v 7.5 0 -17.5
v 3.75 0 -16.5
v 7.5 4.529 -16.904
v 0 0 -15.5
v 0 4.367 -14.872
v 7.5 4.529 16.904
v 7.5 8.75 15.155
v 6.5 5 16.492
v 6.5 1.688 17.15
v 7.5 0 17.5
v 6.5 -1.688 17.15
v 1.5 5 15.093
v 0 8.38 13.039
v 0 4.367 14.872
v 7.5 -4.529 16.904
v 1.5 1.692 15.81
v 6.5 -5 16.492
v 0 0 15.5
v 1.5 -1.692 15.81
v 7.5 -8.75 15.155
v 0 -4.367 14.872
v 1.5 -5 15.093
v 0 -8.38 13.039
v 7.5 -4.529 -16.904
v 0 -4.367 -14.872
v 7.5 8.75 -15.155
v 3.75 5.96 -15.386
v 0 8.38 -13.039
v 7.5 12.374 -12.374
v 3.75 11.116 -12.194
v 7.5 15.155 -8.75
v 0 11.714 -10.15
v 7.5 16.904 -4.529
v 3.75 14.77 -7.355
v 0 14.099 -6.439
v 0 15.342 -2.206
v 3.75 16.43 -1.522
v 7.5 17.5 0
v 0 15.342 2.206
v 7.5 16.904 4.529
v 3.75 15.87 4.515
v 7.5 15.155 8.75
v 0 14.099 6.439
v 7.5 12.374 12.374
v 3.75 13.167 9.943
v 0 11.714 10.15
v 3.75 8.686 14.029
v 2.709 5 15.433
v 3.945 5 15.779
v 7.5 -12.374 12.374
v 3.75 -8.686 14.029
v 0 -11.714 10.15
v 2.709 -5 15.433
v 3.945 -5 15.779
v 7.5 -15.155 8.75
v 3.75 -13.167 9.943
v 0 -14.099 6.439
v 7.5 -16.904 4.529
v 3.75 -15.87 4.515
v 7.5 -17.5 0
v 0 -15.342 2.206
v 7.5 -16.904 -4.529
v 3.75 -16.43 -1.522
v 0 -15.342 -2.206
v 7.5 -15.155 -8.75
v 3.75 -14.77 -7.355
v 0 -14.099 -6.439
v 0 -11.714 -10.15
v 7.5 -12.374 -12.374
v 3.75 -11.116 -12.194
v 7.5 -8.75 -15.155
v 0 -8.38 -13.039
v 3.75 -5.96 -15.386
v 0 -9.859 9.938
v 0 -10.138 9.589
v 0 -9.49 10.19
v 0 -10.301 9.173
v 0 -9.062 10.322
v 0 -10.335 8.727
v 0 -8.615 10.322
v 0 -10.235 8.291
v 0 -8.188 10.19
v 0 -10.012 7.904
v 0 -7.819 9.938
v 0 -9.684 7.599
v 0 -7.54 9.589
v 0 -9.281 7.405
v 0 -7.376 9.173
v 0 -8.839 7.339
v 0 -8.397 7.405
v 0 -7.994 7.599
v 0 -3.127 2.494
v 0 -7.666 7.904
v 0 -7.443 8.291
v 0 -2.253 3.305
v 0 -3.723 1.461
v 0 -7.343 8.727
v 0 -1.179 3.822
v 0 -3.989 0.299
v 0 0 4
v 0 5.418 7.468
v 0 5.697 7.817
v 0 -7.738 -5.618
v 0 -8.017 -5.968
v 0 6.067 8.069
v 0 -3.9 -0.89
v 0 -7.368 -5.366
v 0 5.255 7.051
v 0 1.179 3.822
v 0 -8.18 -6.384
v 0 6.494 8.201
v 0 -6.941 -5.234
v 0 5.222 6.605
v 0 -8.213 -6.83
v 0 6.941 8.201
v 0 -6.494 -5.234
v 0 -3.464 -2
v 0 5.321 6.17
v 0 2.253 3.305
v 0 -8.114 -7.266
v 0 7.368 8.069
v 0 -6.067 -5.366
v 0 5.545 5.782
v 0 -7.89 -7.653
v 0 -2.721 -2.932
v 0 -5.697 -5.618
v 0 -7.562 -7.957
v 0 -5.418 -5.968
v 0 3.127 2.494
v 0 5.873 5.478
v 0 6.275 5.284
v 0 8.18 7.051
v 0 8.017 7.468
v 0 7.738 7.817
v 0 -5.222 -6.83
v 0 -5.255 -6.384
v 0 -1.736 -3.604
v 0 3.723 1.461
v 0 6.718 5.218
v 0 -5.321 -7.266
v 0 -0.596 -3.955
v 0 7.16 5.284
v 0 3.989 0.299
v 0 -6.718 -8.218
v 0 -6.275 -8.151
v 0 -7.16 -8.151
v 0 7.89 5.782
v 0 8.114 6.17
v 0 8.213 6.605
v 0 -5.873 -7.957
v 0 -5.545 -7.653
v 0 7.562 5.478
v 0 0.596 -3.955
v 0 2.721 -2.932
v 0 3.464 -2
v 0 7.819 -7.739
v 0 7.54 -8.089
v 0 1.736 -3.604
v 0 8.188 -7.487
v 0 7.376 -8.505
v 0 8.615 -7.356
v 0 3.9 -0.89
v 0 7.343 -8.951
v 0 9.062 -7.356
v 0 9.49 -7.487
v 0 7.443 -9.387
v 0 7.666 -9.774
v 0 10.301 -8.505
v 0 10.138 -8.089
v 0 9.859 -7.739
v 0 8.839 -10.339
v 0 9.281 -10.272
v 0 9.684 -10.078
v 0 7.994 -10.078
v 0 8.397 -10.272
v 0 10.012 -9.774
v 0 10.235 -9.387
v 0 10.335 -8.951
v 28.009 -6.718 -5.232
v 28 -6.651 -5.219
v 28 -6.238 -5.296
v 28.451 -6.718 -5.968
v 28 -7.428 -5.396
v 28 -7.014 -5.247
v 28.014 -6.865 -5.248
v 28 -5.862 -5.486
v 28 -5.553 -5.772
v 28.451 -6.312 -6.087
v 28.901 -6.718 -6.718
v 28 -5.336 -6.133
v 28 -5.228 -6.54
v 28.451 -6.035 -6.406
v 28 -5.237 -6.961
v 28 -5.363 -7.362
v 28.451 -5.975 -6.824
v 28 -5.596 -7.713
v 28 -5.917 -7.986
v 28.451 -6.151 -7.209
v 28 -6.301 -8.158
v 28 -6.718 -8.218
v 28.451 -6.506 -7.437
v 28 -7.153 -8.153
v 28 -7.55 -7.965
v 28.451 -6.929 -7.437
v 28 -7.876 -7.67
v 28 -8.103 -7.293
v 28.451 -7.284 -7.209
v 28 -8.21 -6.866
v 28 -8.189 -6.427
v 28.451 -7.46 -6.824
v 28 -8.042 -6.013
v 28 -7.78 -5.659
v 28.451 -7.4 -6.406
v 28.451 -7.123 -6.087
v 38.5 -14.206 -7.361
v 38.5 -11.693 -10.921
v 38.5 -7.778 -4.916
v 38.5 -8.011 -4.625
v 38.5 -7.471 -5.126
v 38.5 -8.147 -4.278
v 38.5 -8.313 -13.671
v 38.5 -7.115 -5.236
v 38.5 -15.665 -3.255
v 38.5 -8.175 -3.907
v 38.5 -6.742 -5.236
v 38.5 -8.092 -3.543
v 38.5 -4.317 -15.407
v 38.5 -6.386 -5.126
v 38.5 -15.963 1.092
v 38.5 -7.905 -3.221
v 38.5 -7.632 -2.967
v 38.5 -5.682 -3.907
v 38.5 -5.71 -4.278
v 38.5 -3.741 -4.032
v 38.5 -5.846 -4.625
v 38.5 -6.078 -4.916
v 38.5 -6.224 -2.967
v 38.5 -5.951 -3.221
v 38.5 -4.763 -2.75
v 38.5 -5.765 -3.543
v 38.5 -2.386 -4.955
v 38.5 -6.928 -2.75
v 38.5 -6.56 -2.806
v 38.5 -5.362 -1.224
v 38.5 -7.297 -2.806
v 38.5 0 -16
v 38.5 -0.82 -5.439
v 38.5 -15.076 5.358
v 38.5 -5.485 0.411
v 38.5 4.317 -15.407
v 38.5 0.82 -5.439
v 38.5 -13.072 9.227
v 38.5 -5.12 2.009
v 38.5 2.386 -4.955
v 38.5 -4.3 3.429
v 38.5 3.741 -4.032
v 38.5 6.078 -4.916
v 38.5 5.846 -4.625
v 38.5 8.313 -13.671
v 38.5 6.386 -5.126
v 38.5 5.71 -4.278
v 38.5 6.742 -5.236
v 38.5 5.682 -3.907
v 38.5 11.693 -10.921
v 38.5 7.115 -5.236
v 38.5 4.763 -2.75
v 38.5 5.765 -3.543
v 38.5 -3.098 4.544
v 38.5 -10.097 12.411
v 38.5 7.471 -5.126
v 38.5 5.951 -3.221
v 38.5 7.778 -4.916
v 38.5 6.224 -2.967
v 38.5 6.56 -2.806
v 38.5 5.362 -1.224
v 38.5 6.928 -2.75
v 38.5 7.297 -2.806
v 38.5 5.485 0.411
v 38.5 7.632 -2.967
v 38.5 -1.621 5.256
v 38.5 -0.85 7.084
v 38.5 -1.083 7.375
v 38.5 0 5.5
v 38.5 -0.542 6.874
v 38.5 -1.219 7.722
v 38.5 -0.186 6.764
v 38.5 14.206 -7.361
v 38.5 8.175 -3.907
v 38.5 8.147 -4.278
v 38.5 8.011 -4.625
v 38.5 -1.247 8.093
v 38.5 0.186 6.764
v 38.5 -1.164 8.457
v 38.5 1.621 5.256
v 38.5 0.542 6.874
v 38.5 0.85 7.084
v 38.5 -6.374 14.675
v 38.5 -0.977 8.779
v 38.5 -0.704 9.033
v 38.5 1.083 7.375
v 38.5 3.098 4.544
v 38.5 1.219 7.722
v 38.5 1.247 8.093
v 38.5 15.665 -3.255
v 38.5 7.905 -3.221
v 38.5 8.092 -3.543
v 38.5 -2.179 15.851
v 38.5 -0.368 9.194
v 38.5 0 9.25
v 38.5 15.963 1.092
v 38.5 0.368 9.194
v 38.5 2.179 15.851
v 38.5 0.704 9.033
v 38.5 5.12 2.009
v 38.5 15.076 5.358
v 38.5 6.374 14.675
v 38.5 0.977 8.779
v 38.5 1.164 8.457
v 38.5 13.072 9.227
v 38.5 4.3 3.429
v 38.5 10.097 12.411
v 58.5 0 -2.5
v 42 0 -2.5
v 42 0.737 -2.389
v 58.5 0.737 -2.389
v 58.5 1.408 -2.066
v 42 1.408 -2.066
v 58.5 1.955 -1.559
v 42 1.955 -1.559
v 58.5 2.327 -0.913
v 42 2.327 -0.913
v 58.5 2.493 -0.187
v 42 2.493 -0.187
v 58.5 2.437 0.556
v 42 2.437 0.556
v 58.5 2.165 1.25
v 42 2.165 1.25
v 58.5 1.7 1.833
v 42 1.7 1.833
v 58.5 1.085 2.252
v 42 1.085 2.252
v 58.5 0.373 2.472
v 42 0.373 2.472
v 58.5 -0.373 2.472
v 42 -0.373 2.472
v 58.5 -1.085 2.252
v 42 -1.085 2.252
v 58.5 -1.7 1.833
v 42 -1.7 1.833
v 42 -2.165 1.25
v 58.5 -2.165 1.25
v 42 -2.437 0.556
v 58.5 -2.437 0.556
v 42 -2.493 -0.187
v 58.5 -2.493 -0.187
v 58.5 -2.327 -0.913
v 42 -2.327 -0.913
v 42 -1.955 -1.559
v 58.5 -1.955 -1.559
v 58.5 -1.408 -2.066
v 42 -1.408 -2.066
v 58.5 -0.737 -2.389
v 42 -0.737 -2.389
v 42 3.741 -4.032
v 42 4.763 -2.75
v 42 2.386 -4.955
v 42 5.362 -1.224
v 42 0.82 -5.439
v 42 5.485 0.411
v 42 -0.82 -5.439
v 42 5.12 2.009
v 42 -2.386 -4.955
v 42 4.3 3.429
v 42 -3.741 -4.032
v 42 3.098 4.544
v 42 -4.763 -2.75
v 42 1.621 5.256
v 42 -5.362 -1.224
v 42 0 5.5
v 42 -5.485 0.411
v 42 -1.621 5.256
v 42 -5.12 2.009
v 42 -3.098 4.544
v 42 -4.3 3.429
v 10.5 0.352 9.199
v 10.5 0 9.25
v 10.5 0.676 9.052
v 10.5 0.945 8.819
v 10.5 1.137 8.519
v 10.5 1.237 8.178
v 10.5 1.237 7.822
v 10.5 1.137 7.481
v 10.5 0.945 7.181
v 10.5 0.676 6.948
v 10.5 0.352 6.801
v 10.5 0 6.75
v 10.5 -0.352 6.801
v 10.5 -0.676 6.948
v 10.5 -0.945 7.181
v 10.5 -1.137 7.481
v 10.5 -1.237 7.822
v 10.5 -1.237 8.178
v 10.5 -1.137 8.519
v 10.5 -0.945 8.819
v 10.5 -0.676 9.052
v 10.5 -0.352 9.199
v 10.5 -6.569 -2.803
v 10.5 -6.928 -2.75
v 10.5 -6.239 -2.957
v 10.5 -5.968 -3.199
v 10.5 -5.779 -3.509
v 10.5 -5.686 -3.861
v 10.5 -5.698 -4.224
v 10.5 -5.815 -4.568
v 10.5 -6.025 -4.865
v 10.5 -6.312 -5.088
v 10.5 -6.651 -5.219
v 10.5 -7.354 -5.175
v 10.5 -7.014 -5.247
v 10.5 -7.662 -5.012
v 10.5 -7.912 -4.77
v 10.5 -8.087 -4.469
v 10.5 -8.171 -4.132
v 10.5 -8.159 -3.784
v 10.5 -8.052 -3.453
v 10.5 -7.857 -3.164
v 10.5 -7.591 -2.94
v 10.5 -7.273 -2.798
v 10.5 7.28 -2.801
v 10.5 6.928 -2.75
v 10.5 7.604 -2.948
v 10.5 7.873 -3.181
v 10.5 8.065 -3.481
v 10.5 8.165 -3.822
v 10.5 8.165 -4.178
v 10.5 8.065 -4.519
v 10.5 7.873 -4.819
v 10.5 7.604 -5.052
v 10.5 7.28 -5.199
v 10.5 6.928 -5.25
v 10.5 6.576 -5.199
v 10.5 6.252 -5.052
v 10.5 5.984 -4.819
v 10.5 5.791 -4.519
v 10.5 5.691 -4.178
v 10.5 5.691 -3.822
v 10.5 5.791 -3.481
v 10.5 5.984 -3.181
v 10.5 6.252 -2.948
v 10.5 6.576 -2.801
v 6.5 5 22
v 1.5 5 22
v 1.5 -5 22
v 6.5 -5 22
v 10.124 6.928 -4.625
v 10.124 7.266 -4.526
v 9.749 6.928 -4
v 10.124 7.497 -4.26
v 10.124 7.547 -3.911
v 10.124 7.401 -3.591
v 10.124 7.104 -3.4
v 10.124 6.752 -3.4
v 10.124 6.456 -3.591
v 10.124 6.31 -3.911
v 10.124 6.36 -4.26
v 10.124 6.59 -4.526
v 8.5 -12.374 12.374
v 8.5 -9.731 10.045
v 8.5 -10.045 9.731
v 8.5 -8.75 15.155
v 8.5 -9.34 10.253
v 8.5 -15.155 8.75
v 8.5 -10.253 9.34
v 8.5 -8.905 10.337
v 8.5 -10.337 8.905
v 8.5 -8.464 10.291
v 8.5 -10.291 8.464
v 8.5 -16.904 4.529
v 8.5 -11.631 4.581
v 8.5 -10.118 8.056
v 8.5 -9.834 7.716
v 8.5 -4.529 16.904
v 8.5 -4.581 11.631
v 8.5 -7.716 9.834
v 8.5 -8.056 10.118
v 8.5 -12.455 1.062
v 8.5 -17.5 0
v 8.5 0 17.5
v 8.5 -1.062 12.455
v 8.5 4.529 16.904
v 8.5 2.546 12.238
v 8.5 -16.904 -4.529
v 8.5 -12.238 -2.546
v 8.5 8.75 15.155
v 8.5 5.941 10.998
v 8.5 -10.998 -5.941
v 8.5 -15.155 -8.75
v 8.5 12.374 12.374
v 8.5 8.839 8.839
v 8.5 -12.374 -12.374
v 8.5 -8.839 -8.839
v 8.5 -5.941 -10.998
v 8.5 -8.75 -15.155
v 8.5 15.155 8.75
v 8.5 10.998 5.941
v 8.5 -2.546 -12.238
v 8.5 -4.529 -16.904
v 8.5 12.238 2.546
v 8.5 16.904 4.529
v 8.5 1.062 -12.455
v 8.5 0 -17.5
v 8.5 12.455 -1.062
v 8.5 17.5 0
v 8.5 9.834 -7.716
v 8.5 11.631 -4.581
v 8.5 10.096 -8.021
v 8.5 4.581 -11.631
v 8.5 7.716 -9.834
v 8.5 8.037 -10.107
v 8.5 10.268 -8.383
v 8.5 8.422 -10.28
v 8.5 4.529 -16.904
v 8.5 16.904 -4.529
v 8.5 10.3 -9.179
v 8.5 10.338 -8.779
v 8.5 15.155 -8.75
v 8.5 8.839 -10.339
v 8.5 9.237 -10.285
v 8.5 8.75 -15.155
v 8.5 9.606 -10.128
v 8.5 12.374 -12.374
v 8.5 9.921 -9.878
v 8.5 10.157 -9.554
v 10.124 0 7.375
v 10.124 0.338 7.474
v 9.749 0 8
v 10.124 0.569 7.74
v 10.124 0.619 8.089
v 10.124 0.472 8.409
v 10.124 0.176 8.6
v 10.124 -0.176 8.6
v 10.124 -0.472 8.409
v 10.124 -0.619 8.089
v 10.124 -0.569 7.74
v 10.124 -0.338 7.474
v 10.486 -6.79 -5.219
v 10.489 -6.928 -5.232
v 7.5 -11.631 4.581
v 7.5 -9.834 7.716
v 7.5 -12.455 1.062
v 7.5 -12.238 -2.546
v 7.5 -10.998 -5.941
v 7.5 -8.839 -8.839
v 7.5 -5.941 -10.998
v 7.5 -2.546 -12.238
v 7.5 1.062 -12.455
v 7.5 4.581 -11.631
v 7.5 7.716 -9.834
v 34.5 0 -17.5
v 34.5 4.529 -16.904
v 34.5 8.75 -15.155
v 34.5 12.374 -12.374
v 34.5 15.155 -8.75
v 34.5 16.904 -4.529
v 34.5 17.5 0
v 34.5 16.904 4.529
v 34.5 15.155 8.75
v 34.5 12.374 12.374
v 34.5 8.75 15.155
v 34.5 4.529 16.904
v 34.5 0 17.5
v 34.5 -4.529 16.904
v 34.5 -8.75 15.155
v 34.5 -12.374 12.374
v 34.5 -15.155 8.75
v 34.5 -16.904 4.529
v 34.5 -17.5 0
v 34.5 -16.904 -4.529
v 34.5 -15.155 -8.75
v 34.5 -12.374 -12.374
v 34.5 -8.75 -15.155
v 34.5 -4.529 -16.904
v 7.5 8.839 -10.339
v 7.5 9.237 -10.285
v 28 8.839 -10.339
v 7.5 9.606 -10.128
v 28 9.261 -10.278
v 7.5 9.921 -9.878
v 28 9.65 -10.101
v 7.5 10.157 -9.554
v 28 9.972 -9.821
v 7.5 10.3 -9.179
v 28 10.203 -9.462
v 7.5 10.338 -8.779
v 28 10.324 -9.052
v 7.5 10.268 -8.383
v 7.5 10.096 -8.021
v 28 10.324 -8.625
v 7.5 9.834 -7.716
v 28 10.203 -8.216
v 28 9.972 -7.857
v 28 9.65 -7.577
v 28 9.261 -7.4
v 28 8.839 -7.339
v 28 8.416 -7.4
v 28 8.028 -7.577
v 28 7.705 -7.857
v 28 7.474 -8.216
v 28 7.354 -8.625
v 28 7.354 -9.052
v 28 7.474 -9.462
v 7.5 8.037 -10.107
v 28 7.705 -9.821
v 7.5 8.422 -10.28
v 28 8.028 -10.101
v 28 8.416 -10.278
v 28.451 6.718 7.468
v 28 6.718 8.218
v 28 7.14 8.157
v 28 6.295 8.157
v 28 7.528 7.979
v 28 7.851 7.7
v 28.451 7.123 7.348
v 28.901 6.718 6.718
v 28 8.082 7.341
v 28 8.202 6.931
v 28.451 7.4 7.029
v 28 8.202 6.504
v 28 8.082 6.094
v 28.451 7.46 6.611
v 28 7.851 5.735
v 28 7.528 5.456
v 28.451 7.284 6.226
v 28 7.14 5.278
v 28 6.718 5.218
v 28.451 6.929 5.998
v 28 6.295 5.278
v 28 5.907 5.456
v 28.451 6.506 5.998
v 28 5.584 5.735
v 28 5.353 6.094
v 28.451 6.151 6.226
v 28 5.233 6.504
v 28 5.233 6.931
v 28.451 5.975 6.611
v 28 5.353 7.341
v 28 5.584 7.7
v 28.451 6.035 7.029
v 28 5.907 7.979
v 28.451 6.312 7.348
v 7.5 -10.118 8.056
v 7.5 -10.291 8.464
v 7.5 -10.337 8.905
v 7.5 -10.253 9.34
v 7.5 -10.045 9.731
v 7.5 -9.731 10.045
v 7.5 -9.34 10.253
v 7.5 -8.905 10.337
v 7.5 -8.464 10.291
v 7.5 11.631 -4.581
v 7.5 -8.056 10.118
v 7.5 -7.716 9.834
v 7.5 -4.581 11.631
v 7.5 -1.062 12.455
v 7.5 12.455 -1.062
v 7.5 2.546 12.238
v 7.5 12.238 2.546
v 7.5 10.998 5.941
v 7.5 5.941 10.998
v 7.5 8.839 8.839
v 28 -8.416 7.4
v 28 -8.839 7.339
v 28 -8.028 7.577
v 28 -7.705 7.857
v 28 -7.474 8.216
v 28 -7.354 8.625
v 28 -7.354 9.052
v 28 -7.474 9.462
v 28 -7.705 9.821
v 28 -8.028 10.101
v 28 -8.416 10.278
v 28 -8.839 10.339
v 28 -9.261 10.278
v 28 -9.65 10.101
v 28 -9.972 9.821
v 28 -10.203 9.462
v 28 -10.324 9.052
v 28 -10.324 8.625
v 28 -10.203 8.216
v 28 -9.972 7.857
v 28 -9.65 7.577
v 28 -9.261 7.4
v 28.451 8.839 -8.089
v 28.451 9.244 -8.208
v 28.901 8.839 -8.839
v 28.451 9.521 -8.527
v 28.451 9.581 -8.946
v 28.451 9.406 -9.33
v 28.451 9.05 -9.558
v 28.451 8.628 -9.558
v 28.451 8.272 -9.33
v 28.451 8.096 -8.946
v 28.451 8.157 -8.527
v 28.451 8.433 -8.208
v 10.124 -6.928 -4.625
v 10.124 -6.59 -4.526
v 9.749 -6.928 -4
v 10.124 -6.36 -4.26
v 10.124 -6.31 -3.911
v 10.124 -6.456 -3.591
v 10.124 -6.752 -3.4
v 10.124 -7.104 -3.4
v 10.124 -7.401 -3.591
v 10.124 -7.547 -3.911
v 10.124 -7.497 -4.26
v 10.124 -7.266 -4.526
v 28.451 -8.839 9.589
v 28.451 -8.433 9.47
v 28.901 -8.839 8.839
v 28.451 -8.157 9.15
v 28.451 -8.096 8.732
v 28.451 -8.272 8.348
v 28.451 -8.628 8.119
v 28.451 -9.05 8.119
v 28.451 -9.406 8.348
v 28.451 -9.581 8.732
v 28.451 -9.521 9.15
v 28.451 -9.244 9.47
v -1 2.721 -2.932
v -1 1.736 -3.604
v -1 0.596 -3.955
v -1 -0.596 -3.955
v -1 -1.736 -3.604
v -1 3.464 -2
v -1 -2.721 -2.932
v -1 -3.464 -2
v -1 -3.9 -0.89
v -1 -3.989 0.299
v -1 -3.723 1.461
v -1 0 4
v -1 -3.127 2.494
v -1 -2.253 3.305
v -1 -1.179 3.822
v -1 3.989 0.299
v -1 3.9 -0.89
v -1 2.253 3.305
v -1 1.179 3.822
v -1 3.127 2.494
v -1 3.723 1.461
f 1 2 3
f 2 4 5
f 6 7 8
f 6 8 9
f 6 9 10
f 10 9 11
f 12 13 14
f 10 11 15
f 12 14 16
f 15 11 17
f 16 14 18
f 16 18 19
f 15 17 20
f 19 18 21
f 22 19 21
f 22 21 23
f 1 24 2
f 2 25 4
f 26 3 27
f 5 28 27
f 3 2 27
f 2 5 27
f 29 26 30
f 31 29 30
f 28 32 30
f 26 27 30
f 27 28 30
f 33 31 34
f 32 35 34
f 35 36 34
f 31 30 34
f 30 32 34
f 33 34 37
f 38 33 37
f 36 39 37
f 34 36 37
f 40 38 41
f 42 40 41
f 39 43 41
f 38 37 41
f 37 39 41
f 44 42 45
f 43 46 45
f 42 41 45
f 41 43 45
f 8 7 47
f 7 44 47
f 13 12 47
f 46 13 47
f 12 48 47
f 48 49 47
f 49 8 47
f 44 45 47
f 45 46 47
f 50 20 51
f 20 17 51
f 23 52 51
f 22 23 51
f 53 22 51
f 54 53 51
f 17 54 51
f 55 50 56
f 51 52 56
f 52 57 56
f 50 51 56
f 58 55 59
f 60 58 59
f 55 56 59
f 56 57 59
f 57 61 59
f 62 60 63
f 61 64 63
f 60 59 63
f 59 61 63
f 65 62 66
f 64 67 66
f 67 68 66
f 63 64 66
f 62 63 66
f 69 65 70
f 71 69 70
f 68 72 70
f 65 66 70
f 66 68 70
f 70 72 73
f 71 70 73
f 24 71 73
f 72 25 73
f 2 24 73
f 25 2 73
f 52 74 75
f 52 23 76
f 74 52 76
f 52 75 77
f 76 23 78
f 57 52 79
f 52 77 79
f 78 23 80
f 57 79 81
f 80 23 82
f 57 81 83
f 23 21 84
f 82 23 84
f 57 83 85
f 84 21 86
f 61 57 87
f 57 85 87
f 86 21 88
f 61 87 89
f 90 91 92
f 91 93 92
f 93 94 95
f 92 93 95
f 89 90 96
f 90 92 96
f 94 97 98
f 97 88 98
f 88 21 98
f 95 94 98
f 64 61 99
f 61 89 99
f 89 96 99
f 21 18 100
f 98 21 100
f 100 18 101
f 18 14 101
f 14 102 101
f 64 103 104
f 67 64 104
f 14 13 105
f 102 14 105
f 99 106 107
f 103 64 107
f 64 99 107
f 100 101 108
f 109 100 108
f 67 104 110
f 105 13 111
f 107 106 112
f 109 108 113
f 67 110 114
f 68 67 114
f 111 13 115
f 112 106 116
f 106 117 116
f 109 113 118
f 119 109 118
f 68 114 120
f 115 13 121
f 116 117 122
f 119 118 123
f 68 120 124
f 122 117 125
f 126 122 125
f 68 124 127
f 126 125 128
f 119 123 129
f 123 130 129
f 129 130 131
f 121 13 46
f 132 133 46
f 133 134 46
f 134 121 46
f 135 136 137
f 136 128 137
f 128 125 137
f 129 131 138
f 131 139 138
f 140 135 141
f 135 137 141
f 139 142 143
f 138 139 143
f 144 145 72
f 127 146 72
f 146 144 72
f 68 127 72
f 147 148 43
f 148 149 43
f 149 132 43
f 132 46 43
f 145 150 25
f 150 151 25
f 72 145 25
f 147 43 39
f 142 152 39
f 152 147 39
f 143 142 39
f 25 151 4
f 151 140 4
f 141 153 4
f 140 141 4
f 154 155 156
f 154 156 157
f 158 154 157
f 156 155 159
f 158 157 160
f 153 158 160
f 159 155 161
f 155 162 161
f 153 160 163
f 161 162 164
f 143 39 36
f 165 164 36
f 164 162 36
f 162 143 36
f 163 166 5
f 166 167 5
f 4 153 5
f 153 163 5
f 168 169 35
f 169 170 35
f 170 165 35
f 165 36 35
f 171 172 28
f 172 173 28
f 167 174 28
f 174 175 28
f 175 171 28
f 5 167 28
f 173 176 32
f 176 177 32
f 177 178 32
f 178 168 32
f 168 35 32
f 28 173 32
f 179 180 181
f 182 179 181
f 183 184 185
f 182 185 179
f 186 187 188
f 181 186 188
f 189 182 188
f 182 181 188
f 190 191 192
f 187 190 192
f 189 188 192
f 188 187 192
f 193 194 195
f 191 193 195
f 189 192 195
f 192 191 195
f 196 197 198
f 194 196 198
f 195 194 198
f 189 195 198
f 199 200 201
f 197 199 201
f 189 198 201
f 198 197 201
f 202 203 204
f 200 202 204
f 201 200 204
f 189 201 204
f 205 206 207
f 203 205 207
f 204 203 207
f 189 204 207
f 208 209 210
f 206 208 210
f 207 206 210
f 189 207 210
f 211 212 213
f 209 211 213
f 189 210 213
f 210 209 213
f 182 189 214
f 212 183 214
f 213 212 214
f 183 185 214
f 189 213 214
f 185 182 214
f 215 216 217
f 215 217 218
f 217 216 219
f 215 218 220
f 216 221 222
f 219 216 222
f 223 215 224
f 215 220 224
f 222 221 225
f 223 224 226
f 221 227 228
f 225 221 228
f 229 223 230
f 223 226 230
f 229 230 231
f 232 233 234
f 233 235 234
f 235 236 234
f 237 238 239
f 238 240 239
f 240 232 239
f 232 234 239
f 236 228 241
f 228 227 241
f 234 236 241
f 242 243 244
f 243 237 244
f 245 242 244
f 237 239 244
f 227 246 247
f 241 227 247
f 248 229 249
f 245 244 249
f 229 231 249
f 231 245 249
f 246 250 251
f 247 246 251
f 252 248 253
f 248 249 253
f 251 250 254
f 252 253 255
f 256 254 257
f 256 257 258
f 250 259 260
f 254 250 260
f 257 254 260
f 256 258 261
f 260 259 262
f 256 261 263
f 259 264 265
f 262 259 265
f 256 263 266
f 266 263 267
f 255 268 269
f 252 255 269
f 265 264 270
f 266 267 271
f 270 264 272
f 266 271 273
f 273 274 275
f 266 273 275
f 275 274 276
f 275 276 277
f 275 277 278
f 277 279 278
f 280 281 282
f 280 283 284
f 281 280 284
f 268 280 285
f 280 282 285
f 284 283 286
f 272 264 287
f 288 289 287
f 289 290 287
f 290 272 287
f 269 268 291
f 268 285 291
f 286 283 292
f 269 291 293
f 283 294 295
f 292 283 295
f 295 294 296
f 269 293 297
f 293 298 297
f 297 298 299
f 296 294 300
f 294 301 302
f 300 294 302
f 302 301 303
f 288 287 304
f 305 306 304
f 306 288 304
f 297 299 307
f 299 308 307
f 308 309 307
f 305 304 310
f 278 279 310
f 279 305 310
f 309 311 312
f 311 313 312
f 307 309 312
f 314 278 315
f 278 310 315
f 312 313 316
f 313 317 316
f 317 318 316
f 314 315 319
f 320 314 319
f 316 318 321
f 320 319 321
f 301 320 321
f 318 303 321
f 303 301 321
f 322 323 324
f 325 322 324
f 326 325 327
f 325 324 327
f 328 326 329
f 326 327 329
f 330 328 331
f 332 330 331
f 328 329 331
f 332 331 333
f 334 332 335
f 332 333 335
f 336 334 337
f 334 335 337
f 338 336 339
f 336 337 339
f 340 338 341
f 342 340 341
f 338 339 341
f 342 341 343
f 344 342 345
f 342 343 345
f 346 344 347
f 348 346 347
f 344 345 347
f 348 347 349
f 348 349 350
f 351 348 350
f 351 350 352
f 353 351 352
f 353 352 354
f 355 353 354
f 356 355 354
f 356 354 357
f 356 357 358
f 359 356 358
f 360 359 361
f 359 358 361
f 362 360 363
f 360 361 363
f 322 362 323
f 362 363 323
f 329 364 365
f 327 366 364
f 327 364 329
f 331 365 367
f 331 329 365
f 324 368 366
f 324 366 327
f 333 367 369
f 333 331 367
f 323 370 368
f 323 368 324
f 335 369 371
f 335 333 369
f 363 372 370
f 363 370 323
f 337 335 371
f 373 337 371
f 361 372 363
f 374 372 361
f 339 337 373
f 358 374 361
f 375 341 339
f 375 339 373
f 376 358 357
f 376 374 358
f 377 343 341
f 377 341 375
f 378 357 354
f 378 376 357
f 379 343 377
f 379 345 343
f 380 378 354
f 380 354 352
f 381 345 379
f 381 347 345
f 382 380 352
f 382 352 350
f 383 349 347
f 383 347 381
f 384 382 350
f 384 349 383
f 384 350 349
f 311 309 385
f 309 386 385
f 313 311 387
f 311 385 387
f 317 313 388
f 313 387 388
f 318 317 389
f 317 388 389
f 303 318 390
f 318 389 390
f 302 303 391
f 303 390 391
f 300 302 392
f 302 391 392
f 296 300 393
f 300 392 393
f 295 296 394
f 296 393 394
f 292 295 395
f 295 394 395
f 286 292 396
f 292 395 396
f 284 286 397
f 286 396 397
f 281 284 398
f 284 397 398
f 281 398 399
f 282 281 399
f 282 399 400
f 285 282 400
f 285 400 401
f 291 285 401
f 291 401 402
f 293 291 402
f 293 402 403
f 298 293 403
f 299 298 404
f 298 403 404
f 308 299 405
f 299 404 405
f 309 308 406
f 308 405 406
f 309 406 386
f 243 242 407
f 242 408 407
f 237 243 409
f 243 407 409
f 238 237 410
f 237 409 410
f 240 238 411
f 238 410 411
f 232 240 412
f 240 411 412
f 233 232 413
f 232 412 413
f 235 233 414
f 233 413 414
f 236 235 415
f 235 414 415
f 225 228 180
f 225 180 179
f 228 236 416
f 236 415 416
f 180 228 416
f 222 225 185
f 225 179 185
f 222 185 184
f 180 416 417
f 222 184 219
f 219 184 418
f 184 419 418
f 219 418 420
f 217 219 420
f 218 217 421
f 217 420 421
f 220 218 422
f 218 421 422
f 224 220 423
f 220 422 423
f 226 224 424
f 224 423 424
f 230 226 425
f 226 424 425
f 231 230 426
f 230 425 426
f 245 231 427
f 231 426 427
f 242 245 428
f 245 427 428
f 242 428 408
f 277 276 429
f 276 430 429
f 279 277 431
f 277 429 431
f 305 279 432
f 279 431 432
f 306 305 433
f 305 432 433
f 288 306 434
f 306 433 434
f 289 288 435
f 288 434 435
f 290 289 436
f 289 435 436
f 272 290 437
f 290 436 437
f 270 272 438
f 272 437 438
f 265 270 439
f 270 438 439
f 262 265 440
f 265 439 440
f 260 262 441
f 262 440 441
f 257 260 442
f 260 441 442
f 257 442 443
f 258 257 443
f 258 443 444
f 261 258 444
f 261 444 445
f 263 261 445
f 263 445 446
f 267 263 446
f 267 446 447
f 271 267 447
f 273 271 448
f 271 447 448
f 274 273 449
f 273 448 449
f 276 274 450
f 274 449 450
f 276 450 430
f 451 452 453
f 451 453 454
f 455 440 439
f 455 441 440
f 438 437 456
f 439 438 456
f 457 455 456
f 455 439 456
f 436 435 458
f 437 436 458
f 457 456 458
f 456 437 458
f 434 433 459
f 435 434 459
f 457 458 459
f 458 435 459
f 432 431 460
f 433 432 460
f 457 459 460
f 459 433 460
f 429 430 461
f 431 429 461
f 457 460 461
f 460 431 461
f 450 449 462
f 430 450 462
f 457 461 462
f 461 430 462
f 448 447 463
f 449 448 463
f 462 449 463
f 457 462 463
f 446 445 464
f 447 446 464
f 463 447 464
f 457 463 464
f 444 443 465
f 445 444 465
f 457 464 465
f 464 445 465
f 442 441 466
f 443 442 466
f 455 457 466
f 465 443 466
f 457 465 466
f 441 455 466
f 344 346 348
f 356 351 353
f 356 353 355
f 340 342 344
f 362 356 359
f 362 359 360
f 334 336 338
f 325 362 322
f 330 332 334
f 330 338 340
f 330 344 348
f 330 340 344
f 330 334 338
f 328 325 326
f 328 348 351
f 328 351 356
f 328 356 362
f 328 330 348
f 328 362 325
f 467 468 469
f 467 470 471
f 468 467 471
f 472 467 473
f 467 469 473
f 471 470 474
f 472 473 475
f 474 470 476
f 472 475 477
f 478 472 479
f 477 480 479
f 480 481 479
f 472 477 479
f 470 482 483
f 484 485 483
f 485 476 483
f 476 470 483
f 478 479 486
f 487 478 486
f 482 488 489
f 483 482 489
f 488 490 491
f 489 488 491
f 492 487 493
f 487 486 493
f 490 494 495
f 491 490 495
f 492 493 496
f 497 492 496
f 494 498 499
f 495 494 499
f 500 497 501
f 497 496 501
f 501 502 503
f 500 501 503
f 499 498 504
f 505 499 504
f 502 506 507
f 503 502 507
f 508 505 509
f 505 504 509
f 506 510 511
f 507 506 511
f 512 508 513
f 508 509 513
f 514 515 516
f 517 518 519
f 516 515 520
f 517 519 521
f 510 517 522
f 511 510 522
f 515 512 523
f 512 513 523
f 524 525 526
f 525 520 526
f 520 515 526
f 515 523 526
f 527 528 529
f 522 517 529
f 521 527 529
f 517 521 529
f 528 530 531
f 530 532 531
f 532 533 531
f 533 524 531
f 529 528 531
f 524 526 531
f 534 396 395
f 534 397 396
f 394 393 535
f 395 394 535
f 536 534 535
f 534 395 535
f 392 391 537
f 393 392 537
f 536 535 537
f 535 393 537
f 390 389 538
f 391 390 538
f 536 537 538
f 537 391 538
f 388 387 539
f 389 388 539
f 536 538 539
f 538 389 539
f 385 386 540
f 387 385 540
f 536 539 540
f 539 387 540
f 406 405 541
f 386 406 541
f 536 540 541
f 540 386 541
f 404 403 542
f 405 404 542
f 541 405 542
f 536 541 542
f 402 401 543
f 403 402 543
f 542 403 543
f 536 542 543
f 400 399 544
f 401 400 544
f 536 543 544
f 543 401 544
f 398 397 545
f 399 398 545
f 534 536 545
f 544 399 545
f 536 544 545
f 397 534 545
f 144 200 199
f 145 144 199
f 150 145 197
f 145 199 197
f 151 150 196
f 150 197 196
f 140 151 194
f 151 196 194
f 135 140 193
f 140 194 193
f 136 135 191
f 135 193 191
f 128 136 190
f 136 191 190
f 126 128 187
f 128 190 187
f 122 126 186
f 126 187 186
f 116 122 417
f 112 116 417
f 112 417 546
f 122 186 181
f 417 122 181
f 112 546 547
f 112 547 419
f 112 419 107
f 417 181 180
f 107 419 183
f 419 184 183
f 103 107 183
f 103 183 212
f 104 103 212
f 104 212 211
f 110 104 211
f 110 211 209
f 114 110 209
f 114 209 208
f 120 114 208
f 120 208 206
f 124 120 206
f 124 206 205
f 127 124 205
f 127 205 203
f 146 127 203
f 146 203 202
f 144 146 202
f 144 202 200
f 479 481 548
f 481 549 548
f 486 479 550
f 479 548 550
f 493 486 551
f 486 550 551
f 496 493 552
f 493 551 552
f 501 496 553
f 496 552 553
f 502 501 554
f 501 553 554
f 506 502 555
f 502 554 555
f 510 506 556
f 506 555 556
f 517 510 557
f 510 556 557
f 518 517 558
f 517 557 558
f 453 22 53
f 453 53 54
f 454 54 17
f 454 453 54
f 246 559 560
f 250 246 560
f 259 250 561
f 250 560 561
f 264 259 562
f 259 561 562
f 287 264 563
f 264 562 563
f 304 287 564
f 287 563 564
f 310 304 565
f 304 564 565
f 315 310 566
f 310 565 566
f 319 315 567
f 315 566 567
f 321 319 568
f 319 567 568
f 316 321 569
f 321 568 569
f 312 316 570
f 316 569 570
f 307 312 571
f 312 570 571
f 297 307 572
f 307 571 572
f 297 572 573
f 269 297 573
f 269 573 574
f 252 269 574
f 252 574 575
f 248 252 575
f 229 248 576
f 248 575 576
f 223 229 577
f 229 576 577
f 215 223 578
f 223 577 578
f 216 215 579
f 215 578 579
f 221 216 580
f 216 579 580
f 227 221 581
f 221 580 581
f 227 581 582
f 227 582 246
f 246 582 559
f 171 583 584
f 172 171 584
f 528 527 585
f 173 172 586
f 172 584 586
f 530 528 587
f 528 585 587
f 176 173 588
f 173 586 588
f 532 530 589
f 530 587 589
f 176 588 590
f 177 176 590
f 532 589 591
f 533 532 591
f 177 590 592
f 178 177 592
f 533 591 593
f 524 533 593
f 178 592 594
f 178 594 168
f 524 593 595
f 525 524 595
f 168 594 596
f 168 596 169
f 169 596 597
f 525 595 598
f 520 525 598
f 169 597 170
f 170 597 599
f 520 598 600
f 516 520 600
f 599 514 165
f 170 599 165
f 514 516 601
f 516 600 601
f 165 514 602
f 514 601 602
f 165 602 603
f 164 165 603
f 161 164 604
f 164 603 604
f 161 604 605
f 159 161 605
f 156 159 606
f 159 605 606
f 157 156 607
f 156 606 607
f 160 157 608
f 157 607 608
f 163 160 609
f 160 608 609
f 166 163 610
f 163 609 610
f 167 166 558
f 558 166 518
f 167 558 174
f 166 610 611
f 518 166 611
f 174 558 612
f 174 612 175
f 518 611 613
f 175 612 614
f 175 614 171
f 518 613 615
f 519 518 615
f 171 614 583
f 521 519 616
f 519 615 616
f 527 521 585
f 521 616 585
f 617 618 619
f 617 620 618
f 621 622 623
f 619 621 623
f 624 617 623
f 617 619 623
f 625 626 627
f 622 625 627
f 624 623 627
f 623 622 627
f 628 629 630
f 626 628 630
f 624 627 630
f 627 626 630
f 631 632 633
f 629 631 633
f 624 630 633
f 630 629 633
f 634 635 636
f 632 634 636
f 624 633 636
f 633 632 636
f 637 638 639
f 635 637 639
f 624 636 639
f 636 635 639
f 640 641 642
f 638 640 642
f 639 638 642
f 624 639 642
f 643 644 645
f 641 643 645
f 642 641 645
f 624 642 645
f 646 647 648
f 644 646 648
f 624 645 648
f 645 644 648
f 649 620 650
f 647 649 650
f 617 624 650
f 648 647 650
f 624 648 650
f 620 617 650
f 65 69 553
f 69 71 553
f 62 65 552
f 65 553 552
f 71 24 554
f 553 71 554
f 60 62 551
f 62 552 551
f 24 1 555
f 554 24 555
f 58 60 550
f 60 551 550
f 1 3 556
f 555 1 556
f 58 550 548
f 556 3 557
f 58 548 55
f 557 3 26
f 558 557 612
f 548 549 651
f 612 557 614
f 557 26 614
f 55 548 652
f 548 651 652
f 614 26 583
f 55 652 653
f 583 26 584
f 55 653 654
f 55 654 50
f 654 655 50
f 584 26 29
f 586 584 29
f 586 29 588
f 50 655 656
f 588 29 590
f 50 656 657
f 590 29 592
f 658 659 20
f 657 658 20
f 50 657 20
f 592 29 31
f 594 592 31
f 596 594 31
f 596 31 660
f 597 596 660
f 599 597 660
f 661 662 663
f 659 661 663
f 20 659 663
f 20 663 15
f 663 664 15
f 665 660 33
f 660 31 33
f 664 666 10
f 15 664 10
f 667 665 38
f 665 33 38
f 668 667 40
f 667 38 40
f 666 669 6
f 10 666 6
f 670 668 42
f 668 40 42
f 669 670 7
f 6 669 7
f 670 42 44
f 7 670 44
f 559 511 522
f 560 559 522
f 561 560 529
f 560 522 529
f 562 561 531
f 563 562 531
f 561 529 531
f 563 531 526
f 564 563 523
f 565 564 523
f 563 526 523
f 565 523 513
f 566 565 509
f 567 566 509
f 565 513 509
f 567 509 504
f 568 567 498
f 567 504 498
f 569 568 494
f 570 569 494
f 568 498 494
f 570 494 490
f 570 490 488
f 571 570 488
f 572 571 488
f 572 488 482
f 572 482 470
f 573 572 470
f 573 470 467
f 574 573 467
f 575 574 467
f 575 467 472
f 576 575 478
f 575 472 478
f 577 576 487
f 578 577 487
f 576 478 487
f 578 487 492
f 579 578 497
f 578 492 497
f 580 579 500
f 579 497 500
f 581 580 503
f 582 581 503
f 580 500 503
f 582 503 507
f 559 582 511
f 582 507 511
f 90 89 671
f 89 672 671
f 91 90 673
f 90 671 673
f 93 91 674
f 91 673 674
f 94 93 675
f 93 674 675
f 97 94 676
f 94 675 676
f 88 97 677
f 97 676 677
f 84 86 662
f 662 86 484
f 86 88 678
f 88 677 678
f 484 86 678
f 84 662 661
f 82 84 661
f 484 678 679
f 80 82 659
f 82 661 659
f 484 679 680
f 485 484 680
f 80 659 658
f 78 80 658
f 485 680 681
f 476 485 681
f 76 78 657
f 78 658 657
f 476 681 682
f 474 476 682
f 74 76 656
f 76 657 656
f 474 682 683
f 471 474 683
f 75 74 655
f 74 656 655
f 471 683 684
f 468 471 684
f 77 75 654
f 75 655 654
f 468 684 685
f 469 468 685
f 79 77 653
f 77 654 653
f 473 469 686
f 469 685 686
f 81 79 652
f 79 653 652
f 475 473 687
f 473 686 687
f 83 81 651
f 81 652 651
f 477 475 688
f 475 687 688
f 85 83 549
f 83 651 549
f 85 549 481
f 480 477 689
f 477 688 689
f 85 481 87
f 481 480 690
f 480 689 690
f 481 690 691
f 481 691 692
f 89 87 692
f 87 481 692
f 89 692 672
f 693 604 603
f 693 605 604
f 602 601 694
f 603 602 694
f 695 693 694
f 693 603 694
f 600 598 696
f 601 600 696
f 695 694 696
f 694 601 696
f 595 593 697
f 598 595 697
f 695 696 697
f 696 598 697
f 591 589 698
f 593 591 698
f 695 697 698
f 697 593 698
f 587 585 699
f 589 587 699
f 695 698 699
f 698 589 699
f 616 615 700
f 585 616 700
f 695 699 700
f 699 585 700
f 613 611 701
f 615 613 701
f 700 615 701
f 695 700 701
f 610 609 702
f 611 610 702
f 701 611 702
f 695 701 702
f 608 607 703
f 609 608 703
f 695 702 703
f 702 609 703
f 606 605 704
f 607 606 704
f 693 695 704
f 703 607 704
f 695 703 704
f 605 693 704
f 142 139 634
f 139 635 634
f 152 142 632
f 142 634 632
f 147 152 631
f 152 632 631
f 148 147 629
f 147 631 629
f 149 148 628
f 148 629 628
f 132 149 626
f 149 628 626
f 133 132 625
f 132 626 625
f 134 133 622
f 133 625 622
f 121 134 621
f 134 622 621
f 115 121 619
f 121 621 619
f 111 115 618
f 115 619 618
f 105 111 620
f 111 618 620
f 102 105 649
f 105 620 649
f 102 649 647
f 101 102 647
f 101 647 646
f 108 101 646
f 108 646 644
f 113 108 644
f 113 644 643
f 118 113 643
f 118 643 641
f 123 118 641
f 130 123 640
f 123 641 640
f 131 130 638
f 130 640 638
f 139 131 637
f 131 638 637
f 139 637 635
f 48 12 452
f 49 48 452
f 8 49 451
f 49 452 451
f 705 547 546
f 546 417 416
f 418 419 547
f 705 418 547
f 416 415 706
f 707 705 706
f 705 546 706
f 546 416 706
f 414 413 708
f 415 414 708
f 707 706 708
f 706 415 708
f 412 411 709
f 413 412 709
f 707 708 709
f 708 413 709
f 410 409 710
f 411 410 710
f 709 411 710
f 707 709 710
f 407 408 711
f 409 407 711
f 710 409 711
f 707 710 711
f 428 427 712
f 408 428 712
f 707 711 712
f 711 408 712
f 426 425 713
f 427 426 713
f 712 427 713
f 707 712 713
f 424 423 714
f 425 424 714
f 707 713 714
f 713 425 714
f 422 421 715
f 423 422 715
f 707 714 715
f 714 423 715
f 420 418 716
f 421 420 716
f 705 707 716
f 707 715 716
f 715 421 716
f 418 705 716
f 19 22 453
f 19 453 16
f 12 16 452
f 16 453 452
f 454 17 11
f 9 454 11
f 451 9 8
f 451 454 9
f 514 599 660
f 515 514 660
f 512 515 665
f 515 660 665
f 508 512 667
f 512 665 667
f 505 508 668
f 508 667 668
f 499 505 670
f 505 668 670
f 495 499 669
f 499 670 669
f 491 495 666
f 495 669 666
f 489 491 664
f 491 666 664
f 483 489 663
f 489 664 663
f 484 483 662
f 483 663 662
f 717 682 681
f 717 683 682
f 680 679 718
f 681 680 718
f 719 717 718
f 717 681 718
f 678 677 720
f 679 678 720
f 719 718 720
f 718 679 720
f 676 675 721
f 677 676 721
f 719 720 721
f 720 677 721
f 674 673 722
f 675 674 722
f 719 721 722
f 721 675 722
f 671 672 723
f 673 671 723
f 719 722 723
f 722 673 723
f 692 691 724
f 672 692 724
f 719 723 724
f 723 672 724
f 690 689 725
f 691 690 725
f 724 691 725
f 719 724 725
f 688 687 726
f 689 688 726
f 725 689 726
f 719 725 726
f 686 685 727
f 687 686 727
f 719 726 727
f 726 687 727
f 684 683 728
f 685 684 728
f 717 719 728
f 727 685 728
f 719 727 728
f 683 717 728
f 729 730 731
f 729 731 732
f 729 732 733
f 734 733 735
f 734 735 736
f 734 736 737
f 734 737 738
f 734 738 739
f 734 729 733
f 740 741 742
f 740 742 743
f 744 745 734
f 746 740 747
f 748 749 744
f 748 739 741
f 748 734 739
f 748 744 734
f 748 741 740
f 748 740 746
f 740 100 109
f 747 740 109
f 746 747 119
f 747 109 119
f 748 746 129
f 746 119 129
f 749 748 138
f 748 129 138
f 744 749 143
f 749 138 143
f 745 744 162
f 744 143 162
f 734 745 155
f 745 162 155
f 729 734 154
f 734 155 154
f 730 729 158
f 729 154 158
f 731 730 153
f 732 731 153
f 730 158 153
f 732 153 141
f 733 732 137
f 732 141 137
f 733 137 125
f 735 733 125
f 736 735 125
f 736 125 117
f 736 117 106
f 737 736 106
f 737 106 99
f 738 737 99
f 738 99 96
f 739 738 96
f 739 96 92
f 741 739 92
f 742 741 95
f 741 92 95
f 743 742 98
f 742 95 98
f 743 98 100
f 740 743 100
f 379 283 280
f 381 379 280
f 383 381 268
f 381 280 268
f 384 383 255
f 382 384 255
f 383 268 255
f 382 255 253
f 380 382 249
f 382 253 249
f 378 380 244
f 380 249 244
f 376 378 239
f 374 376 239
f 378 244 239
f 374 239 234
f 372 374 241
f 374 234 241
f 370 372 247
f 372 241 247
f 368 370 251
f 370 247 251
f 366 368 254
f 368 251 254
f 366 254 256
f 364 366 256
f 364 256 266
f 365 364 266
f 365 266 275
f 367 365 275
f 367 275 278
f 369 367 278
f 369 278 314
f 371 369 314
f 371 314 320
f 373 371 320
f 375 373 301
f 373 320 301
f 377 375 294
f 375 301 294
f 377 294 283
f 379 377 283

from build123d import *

# Parameters (mm, degrees)
BOSS_EXTRUDE1_REACH            = 59.868
SKETCH2_W                      = 5
SKETCH2_H                      = 10
SKETCH3_R                      = 4
BOSS_EXTRUDE2_DEPTH            = 1
SKETCH4_R                      = 5.5
BOSS_EXTRUDE3_DEPTH            = 3.5
SKETCH5_R                      = 2.5
BOSS_EXTRUDE4_DEPTH            = 16.5
F_2_5_2_5_DIAMETER_HOLE1_D     = 2.5
F_2_5_2_5_DIAMETER_HOLE1_DEPTH = 28
F_2_5_2_5_DIAMETER_HOLE1_TIP   = 0.751075774
F_3_0_3_DIAMETER_HOLE1_D       = 3
F_3_0_3_DIAMETER_HOLE1_DEPTH   = 28
F_3_0_3_DIAMETER_HOLE1_TIP     = 0.901290929
CHAMFER1_SIZE                  = 1.5
CHAMFER1_SIZE2                 = 4


with BuildPart() as part:
    # Sketch1 → Revolve1 (revolve)
    with BuildSketch(Plane.XY, mode=Mode.PRIVATE) as revolve1_sk:
        Polygon((0, 15.5), (0, 0), (38.5, 0), (38.5, 17.5), (8.5, 17.5), (8.5, 12.5), (7.5, 12.5), (7.5, 17.5), align=None)
    revolve(revolve1_sk.sketch.rotate(Axis((0, 0, 0), (1, 0, 0)), 270), axis=Axis((0, 0, 0), (1, 0, 0)))

    # Sketch2 → Boss-Extrude1 (add, up to next)
    with BuildSketch(Plane.XY.offset(22), mode=Mode.PRIVATE) as boss_extrude1_sk1:
        with Locations((4, 0)):
            Rectangle(SKETCH2_W, SKETCH2_H)
    boss_extrude1_tool1 = extrude(boss_extrude1_sk1.sketch, amount=-BOSS_EXTRUDE1_REACH, mode=Mode.PRIVATE) - part.part
    add(boss_extrude1_tool1.solids().sort_by_distance((4, 0, 22))[0])

    # Sketch3 → Boss-Extrude2 (add)
    with BuildSketch(Plane.ZY):
        Circle(SKETCH3_R)
    extrude(amount=BOSS_EXTRUDE2_DEPTH)

    # Sketch4 → Boss-Extrude3 (add)
    with BuildSketch(Plane(origin=(38.5, 0, 0), x_dir=(0, 0, -1), z_dir=(1, 0, 0))):
        with Locations(Location((0, 0, 0), (0, 0, 180))):
            Circle(SKETCH4_R)
    extrude(amount=BOSS_EXTRUDE3_DEPTH)

    # Sketch5 → Boss-Extrude4 (add)
    with BuildSketch(Plane(origin=(42, 0, 0), x_dir=(0, 0, -1), z_dir=(1, 0, 0))):
        Circle(SKETCH5_R)
    extrude(amount=BOSS_EXTRUDE4_DEPTH)

    # Ø2.5 (2.5) Diameter Hole1
    with Locations(Plane(origin=(38.5, 0, 0), x_dir=(0, 0, -1), z_dir=(1, 0, 0))):
        with Locations((4, -6.92820323), (4, 6.92820323), (-8, 0)):
            Hole(F_2_5_2_5_DIAMETER_HOLE1_D / 2, depth=F_2_5_2_5_DIAMETER_HOLE1_DEPTH)
            with Locations((0, 0, -(F_2_5_2_5_DIAMETER_HOLE1_DEPTH + F_2_5_2_5_DIAMETER_HOLE1_TIP / 2))):  # 118° drill point
                Cone(0, F_2_5_2_5_DIAMETER_HOLE1_D / 2, F_2_5_2_5_DIAMETER_HOLE1_TIP, mode=Mode.SUBTRACT)

    # Ø3.0 (3) Diameter Hole1
    with Locations(Plane.ZY):
        with Locations((-6.717514421, -6.717514421), (8.838834765, -8.838834765), (6.717514421, 6.717514421), (-8.838834765, 8.838834765)):
            Hole(F_3_0_3_DIAMETER_HOLE1_D / 2, depth=F_3_0_3_DIAMETER_HOLE1_DEPTH)
            with Locations((0, 0, -(F_3_0_3_DIAMETER_HOLE1_DEPTH + F_3_0_3_DIAMETER_HOLE1_TIP / 2))):  # 118° drill point
                Cone(0, F_3_0_3_DIAMETER_HOLE1_D / 2, F_3_0_3_DIAMETER_HOLE1_TIP, mode=Mode.SUBTRACT)

    # Chamfer1
    chamfer1_edges = [part.edges().sort_by_distance(p)[0] for p in [
        (38.5, 0, 17.5),
    ]]
    chamfer1_side = [part.faces().sort_by_distance(p)[0] for p in [
        (38.5, 0, 17.005025253),
    ]]
    chamfer(chamfer1_edges, length=CHAMFER1_SIZE, length2=CHAMFER1_SIZE2, reference=chamfer1_side[0])


solid = part.part
